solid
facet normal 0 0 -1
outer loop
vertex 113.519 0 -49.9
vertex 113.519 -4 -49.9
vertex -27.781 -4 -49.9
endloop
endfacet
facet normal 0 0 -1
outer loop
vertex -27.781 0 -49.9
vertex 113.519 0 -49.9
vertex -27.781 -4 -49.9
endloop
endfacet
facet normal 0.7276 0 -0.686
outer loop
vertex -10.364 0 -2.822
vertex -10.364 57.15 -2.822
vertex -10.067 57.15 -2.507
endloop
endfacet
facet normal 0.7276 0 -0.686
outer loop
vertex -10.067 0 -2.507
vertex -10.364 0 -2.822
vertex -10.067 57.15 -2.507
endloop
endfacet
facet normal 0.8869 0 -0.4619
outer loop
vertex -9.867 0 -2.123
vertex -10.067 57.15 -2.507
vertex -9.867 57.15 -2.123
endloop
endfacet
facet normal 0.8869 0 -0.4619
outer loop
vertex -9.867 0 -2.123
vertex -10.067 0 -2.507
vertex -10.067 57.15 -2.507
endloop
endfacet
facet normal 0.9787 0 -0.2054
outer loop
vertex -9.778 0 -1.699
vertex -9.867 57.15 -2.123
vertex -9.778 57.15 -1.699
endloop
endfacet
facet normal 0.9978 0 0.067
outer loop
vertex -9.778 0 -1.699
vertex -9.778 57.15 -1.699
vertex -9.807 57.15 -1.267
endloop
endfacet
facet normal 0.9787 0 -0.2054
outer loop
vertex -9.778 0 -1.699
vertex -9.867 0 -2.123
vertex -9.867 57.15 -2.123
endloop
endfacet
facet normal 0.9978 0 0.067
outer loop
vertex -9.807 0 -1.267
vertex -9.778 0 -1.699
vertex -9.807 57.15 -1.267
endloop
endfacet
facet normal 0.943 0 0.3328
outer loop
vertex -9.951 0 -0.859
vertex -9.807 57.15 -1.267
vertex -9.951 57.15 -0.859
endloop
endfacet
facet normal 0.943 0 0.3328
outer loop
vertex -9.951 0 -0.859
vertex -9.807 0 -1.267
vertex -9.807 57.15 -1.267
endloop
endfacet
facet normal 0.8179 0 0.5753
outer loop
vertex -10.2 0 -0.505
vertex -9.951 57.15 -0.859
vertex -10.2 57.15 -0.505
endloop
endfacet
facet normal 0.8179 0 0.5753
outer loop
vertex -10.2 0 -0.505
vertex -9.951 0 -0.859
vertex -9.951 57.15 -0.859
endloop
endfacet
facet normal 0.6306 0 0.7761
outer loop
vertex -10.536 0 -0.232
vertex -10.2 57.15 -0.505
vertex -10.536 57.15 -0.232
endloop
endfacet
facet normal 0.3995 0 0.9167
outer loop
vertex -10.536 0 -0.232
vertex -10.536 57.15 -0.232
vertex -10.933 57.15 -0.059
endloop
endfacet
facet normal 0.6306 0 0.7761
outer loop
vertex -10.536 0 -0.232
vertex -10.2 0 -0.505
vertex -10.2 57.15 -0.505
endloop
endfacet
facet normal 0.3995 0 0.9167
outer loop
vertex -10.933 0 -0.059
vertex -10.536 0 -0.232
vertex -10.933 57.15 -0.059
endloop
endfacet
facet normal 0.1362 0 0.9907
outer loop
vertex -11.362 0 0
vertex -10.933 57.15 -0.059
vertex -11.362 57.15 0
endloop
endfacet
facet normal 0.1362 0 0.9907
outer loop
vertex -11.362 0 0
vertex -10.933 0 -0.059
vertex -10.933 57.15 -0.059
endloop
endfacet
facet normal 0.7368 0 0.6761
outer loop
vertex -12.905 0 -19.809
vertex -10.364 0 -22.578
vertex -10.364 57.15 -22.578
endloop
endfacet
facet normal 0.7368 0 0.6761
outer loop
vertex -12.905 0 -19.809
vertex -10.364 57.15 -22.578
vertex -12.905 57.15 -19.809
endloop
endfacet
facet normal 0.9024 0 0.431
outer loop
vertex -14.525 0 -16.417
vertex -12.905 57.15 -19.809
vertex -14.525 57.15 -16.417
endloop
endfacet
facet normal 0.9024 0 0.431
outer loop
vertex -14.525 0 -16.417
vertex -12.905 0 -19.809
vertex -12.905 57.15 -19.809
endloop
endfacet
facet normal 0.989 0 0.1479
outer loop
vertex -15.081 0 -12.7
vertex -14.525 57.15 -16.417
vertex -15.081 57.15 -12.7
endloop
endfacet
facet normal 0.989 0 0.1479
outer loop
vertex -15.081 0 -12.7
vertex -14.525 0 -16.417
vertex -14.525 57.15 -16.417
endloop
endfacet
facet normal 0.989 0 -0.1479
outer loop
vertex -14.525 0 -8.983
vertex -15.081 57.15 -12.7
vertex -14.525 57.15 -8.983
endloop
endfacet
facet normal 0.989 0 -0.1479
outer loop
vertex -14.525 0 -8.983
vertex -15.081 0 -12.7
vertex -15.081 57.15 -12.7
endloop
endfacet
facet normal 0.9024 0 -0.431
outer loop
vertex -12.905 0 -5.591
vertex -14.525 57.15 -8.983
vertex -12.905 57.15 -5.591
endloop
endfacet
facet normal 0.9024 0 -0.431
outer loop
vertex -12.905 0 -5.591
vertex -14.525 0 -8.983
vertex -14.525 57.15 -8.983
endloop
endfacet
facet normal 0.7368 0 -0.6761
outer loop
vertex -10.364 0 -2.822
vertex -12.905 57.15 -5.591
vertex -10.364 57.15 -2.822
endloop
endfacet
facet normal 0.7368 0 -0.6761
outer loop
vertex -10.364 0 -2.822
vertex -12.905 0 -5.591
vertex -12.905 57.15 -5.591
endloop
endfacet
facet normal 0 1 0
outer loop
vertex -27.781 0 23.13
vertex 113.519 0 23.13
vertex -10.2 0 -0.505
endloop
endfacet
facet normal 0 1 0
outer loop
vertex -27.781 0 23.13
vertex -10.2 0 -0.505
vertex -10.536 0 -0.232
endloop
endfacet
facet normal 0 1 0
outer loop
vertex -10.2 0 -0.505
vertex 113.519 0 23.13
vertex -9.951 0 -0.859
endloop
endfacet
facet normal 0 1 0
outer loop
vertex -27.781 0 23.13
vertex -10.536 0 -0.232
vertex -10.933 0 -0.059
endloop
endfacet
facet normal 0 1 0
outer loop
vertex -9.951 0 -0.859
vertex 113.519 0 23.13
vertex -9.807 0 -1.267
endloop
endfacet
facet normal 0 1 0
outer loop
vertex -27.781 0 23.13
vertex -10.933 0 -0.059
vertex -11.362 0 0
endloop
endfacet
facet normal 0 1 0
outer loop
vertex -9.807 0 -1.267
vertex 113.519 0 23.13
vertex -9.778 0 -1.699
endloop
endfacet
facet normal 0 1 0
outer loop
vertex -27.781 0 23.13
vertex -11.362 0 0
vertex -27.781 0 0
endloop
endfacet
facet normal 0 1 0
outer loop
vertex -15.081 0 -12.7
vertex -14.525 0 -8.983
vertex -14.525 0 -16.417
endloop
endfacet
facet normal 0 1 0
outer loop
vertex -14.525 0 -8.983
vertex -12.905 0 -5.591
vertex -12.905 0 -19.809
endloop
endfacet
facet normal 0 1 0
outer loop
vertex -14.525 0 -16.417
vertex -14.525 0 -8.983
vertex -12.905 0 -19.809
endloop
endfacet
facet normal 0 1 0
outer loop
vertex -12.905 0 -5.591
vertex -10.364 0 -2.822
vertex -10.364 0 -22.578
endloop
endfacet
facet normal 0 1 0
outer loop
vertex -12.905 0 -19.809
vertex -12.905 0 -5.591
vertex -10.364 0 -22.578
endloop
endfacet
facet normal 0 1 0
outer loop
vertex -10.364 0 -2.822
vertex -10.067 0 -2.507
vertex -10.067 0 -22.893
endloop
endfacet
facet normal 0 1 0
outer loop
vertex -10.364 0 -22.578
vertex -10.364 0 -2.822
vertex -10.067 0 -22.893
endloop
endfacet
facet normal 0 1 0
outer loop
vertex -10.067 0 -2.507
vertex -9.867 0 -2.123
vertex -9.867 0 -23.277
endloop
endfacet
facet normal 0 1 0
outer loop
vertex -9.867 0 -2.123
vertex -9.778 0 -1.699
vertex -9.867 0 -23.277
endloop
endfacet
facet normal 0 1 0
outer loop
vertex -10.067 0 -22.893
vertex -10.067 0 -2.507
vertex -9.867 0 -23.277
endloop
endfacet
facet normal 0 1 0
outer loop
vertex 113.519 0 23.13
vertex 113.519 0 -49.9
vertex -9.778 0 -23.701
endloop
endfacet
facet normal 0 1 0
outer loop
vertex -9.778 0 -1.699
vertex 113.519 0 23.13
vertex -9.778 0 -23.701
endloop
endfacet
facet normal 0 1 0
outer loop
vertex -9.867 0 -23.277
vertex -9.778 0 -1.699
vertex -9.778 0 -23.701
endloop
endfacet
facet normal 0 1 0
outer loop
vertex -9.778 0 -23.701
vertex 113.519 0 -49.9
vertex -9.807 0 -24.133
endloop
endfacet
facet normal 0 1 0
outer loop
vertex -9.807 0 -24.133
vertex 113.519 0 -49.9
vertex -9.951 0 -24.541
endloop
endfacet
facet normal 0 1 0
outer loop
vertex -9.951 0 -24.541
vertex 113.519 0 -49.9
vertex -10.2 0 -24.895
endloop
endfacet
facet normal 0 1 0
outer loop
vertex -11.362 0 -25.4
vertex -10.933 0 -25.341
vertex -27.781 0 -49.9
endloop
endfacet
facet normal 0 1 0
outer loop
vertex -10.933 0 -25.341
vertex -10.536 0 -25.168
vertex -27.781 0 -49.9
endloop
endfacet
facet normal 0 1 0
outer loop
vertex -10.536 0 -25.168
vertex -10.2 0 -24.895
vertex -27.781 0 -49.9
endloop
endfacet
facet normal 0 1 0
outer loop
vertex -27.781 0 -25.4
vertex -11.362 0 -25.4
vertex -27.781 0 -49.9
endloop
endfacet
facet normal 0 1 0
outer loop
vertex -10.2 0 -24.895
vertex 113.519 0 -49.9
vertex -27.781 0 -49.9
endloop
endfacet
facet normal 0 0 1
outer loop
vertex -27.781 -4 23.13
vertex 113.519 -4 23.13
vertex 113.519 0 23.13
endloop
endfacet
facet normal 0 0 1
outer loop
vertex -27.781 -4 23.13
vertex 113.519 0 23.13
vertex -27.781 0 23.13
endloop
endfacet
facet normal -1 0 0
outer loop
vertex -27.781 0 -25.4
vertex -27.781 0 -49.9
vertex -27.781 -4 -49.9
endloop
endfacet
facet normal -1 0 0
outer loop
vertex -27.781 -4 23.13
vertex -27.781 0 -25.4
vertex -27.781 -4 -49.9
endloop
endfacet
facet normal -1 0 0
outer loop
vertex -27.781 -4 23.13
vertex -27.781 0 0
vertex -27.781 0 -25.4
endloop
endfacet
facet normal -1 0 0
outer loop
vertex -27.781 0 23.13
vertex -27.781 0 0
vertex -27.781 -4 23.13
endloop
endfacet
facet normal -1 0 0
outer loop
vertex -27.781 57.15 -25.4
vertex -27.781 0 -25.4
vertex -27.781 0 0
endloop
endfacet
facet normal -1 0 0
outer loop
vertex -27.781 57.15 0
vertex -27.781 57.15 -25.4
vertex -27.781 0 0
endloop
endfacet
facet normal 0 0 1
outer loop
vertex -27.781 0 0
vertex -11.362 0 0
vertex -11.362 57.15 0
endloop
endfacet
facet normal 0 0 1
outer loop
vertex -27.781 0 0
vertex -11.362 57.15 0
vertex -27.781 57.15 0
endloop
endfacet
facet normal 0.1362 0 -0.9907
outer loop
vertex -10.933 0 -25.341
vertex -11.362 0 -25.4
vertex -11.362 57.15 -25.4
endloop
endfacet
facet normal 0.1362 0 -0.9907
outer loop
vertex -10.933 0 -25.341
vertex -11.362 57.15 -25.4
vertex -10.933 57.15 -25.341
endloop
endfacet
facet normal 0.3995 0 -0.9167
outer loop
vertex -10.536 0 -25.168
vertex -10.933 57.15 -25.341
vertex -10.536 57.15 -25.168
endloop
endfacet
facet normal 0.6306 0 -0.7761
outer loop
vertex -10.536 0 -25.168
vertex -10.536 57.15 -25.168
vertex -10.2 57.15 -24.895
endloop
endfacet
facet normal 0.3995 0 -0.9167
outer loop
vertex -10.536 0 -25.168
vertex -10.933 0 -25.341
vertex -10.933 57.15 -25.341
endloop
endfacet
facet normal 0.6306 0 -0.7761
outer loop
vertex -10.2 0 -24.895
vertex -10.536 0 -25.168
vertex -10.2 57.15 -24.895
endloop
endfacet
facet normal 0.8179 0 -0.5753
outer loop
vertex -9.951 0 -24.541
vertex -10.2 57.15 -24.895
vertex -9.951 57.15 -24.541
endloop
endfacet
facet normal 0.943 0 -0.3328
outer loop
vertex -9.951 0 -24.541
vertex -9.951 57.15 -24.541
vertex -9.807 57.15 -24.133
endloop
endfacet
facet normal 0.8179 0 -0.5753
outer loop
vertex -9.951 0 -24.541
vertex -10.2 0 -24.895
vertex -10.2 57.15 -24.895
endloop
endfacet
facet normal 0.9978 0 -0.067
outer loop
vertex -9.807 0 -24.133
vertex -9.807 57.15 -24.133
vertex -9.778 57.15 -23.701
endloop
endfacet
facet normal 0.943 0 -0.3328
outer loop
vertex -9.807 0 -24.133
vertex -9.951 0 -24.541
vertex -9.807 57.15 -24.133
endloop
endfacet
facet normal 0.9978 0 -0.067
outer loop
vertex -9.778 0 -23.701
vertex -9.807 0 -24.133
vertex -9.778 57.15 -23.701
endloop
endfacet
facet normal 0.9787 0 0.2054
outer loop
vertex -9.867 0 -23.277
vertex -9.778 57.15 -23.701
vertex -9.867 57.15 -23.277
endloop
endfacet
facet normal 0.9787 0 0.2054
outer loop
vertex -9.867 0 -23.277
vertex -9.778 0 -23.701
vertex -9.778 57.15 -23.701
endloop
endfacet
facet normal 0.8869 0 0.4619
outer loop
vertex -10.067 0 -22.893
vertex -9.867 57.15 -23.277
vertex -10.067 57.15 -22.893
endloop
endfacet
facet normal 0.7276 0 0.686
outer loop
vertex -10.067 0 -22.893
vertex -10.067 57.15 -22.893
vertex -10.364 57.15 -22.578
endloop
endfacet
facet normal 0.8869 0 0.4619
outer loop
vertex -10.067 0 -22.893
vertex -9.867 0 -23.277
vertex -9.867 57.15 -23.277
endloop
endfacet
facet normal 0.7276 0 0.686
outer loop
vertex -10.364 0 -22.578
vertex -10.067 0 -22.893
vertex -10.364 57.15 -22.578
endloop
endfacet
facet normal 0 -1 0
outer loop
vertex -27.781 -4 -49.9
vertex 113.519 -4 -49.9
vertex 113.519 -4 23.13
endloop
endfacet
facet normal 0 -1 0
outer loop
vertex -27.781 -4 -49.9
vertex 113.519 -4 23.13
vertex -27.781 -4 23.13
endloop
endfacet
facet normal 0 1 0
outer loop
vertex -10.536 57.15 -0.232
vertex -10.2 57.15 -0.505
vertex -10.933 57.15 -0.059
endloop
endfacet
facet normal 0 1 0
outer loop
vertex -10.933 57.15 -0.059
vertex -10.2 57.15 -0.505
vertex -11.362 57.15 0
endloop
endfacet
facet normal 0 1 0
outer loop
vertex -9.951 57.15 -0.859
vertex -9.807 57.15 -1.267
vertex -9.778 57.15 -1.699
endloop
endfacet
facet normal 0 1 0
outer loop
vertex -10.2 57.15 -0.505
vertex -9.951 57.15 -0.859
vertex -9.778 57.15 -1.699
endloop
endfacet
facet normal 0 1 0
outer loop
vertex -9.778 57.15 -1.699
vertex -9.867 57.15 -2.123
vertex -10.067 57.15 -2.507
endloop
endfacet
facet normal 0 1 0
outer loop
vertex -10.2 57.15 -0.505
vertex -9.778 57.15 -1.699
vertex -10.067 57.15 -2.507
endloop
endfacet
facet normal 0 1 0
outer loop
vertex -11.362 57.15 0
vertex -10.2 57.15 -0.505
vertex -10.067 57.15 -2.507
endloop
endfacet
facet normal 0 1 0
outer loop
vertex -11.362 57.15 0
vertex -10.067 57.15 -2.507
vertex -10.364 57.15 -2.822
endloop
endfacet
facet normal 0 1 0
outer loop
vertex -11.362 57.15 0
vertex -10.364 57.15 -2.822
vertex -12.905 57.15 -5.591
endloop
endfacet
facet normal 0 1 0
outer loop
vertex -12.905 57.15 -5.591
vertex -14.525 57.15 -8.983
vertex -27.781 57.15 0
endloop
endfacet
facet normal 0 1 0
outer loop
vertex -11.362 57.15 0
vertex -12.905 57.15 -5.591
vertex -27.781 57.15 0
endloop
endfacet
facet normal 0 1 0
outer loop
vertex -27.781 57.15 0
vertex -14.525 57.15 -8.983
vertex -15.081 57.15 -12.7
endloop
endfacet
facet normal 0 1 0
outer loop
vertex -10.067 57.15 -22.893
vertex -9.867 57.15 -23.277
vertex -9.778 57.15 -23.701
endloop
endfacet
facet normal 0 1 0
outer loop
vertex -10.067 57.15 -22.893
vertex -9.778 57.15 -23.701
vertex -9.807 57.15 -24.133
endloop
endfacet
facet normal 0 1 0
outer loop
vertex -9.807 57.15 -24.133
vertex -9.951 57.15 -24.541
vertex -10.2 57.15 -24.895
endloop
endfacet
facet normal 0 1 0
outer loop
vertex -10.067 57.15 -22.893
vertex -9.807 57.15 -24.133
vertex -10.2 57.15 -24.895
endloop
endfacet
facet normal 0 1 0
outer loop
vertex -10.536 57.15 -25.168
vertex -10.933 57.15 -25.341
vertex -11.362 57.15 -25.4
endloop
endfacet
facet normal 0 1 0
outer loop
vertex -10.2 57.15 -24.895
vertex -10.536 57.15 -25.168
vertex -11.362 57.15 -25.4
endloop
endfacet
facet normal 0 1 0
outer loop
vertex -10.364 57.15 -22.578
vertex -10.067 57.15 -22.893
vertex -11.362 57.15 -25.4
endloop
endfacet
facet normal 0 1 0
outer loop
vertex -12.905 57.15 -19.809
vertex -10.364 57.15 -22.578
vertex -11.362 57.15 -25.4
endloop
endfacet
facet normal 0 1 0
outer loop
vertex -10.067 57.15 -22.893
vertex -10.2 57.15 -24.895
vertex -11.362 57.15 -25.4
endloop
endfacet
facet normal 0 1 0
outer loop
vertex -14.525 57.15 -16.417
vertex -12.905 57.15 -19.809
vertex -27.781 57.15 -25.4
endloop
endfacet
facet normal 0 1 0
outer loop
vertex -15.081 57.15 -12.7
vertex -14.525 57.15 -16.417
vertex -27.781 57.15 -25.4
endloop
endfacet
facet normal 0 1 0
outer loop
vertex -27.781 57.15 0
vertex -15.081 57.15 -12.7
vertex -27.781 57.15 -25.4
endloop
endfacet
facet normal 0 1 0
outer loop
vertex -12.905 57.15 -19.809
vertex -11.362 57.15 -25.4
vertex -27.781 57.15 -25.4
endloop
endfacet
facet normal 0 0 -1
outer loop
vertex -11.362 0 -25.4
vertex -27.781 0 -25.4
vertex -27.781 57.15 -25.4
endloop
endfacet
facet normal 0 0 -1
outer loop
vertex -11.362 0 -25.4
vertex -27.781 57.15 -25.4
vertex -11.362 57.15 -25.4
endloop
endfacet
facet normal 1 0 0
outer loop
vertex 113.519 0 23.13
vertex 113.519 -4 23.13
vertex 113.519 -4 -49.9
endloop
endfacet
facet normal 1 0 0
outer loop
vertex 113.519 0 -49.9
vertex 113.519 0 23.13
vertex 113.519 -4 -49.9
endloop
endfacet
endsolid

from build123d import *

# Parameters (mm, degrees)
BOSS_EXTRUDE1_DEPTH = 57.15
SKETCH4_W           = 21.391570407
SKETCH4_H           = 73.03
BOSS_EXTRUDE2_DEPTH = 4
SKETCH5_W           = 119.908429593
SKETCH5_H           = 73.03
BOSS_EXTRUDE3_DEPTH = 4


with BuildPart() as part:
    # Sketch3 → Boss-Extrude1 (new body)
    with BuildSketch(Plane(origin=(0, 0, 0), x_dir=(1, 0, 0), z_dir=(0, 1, 0))):
        with BuildLine():
            Line((-27.78125, 0), (-27.78125, 25.4))
            Line((-27.78125, 25.4), (-11.361506121, 25.4))
            ThreePointArc((-11.361506121, 25.4), (-9.864796768, 24.341666667), (-10.363699885, 22.577777778))
            ThreePointArc((-10.363699885, 22.577777778), (-15.08125, 12.7), (-10.363699885, 2.822222222))
            ThreePointArc((-10.363699885, 2.822222222), (-9.864796768, 1.058333333), (-11.361506121, 0))
            Line((-11.361506121, 0), (-27.78125, 0))
        make_face()
    extrude(amount=BOSS_EXTRUDE1_DEPTH)

    # Sketch4 → Boss-Extrude2 (add)
    with BuildSketch(Plane.XZ):
        with Locations((-17.085464796, -13.384999898)):
            Rectangle(SKETCH4_W, SKETCH4_H)
    extrude(amount=BOSS_EXTRUDE2_DEPTH)

    # Sketch5 → Boss-Extrude3 (add)
    with BuildSketch(Plane(origin=(0, -4, 0), x_dir=(-1, 0, 0), z_dir=(0, -1, 0))):
        with Locations((-53.564535204, 13.384999898)):
            Rectangle(SKETCH5_W, SKETCH5_H)
    extrude(amount=-BOSS_EXTRUDE3_DEPTH)


solid = part.part
